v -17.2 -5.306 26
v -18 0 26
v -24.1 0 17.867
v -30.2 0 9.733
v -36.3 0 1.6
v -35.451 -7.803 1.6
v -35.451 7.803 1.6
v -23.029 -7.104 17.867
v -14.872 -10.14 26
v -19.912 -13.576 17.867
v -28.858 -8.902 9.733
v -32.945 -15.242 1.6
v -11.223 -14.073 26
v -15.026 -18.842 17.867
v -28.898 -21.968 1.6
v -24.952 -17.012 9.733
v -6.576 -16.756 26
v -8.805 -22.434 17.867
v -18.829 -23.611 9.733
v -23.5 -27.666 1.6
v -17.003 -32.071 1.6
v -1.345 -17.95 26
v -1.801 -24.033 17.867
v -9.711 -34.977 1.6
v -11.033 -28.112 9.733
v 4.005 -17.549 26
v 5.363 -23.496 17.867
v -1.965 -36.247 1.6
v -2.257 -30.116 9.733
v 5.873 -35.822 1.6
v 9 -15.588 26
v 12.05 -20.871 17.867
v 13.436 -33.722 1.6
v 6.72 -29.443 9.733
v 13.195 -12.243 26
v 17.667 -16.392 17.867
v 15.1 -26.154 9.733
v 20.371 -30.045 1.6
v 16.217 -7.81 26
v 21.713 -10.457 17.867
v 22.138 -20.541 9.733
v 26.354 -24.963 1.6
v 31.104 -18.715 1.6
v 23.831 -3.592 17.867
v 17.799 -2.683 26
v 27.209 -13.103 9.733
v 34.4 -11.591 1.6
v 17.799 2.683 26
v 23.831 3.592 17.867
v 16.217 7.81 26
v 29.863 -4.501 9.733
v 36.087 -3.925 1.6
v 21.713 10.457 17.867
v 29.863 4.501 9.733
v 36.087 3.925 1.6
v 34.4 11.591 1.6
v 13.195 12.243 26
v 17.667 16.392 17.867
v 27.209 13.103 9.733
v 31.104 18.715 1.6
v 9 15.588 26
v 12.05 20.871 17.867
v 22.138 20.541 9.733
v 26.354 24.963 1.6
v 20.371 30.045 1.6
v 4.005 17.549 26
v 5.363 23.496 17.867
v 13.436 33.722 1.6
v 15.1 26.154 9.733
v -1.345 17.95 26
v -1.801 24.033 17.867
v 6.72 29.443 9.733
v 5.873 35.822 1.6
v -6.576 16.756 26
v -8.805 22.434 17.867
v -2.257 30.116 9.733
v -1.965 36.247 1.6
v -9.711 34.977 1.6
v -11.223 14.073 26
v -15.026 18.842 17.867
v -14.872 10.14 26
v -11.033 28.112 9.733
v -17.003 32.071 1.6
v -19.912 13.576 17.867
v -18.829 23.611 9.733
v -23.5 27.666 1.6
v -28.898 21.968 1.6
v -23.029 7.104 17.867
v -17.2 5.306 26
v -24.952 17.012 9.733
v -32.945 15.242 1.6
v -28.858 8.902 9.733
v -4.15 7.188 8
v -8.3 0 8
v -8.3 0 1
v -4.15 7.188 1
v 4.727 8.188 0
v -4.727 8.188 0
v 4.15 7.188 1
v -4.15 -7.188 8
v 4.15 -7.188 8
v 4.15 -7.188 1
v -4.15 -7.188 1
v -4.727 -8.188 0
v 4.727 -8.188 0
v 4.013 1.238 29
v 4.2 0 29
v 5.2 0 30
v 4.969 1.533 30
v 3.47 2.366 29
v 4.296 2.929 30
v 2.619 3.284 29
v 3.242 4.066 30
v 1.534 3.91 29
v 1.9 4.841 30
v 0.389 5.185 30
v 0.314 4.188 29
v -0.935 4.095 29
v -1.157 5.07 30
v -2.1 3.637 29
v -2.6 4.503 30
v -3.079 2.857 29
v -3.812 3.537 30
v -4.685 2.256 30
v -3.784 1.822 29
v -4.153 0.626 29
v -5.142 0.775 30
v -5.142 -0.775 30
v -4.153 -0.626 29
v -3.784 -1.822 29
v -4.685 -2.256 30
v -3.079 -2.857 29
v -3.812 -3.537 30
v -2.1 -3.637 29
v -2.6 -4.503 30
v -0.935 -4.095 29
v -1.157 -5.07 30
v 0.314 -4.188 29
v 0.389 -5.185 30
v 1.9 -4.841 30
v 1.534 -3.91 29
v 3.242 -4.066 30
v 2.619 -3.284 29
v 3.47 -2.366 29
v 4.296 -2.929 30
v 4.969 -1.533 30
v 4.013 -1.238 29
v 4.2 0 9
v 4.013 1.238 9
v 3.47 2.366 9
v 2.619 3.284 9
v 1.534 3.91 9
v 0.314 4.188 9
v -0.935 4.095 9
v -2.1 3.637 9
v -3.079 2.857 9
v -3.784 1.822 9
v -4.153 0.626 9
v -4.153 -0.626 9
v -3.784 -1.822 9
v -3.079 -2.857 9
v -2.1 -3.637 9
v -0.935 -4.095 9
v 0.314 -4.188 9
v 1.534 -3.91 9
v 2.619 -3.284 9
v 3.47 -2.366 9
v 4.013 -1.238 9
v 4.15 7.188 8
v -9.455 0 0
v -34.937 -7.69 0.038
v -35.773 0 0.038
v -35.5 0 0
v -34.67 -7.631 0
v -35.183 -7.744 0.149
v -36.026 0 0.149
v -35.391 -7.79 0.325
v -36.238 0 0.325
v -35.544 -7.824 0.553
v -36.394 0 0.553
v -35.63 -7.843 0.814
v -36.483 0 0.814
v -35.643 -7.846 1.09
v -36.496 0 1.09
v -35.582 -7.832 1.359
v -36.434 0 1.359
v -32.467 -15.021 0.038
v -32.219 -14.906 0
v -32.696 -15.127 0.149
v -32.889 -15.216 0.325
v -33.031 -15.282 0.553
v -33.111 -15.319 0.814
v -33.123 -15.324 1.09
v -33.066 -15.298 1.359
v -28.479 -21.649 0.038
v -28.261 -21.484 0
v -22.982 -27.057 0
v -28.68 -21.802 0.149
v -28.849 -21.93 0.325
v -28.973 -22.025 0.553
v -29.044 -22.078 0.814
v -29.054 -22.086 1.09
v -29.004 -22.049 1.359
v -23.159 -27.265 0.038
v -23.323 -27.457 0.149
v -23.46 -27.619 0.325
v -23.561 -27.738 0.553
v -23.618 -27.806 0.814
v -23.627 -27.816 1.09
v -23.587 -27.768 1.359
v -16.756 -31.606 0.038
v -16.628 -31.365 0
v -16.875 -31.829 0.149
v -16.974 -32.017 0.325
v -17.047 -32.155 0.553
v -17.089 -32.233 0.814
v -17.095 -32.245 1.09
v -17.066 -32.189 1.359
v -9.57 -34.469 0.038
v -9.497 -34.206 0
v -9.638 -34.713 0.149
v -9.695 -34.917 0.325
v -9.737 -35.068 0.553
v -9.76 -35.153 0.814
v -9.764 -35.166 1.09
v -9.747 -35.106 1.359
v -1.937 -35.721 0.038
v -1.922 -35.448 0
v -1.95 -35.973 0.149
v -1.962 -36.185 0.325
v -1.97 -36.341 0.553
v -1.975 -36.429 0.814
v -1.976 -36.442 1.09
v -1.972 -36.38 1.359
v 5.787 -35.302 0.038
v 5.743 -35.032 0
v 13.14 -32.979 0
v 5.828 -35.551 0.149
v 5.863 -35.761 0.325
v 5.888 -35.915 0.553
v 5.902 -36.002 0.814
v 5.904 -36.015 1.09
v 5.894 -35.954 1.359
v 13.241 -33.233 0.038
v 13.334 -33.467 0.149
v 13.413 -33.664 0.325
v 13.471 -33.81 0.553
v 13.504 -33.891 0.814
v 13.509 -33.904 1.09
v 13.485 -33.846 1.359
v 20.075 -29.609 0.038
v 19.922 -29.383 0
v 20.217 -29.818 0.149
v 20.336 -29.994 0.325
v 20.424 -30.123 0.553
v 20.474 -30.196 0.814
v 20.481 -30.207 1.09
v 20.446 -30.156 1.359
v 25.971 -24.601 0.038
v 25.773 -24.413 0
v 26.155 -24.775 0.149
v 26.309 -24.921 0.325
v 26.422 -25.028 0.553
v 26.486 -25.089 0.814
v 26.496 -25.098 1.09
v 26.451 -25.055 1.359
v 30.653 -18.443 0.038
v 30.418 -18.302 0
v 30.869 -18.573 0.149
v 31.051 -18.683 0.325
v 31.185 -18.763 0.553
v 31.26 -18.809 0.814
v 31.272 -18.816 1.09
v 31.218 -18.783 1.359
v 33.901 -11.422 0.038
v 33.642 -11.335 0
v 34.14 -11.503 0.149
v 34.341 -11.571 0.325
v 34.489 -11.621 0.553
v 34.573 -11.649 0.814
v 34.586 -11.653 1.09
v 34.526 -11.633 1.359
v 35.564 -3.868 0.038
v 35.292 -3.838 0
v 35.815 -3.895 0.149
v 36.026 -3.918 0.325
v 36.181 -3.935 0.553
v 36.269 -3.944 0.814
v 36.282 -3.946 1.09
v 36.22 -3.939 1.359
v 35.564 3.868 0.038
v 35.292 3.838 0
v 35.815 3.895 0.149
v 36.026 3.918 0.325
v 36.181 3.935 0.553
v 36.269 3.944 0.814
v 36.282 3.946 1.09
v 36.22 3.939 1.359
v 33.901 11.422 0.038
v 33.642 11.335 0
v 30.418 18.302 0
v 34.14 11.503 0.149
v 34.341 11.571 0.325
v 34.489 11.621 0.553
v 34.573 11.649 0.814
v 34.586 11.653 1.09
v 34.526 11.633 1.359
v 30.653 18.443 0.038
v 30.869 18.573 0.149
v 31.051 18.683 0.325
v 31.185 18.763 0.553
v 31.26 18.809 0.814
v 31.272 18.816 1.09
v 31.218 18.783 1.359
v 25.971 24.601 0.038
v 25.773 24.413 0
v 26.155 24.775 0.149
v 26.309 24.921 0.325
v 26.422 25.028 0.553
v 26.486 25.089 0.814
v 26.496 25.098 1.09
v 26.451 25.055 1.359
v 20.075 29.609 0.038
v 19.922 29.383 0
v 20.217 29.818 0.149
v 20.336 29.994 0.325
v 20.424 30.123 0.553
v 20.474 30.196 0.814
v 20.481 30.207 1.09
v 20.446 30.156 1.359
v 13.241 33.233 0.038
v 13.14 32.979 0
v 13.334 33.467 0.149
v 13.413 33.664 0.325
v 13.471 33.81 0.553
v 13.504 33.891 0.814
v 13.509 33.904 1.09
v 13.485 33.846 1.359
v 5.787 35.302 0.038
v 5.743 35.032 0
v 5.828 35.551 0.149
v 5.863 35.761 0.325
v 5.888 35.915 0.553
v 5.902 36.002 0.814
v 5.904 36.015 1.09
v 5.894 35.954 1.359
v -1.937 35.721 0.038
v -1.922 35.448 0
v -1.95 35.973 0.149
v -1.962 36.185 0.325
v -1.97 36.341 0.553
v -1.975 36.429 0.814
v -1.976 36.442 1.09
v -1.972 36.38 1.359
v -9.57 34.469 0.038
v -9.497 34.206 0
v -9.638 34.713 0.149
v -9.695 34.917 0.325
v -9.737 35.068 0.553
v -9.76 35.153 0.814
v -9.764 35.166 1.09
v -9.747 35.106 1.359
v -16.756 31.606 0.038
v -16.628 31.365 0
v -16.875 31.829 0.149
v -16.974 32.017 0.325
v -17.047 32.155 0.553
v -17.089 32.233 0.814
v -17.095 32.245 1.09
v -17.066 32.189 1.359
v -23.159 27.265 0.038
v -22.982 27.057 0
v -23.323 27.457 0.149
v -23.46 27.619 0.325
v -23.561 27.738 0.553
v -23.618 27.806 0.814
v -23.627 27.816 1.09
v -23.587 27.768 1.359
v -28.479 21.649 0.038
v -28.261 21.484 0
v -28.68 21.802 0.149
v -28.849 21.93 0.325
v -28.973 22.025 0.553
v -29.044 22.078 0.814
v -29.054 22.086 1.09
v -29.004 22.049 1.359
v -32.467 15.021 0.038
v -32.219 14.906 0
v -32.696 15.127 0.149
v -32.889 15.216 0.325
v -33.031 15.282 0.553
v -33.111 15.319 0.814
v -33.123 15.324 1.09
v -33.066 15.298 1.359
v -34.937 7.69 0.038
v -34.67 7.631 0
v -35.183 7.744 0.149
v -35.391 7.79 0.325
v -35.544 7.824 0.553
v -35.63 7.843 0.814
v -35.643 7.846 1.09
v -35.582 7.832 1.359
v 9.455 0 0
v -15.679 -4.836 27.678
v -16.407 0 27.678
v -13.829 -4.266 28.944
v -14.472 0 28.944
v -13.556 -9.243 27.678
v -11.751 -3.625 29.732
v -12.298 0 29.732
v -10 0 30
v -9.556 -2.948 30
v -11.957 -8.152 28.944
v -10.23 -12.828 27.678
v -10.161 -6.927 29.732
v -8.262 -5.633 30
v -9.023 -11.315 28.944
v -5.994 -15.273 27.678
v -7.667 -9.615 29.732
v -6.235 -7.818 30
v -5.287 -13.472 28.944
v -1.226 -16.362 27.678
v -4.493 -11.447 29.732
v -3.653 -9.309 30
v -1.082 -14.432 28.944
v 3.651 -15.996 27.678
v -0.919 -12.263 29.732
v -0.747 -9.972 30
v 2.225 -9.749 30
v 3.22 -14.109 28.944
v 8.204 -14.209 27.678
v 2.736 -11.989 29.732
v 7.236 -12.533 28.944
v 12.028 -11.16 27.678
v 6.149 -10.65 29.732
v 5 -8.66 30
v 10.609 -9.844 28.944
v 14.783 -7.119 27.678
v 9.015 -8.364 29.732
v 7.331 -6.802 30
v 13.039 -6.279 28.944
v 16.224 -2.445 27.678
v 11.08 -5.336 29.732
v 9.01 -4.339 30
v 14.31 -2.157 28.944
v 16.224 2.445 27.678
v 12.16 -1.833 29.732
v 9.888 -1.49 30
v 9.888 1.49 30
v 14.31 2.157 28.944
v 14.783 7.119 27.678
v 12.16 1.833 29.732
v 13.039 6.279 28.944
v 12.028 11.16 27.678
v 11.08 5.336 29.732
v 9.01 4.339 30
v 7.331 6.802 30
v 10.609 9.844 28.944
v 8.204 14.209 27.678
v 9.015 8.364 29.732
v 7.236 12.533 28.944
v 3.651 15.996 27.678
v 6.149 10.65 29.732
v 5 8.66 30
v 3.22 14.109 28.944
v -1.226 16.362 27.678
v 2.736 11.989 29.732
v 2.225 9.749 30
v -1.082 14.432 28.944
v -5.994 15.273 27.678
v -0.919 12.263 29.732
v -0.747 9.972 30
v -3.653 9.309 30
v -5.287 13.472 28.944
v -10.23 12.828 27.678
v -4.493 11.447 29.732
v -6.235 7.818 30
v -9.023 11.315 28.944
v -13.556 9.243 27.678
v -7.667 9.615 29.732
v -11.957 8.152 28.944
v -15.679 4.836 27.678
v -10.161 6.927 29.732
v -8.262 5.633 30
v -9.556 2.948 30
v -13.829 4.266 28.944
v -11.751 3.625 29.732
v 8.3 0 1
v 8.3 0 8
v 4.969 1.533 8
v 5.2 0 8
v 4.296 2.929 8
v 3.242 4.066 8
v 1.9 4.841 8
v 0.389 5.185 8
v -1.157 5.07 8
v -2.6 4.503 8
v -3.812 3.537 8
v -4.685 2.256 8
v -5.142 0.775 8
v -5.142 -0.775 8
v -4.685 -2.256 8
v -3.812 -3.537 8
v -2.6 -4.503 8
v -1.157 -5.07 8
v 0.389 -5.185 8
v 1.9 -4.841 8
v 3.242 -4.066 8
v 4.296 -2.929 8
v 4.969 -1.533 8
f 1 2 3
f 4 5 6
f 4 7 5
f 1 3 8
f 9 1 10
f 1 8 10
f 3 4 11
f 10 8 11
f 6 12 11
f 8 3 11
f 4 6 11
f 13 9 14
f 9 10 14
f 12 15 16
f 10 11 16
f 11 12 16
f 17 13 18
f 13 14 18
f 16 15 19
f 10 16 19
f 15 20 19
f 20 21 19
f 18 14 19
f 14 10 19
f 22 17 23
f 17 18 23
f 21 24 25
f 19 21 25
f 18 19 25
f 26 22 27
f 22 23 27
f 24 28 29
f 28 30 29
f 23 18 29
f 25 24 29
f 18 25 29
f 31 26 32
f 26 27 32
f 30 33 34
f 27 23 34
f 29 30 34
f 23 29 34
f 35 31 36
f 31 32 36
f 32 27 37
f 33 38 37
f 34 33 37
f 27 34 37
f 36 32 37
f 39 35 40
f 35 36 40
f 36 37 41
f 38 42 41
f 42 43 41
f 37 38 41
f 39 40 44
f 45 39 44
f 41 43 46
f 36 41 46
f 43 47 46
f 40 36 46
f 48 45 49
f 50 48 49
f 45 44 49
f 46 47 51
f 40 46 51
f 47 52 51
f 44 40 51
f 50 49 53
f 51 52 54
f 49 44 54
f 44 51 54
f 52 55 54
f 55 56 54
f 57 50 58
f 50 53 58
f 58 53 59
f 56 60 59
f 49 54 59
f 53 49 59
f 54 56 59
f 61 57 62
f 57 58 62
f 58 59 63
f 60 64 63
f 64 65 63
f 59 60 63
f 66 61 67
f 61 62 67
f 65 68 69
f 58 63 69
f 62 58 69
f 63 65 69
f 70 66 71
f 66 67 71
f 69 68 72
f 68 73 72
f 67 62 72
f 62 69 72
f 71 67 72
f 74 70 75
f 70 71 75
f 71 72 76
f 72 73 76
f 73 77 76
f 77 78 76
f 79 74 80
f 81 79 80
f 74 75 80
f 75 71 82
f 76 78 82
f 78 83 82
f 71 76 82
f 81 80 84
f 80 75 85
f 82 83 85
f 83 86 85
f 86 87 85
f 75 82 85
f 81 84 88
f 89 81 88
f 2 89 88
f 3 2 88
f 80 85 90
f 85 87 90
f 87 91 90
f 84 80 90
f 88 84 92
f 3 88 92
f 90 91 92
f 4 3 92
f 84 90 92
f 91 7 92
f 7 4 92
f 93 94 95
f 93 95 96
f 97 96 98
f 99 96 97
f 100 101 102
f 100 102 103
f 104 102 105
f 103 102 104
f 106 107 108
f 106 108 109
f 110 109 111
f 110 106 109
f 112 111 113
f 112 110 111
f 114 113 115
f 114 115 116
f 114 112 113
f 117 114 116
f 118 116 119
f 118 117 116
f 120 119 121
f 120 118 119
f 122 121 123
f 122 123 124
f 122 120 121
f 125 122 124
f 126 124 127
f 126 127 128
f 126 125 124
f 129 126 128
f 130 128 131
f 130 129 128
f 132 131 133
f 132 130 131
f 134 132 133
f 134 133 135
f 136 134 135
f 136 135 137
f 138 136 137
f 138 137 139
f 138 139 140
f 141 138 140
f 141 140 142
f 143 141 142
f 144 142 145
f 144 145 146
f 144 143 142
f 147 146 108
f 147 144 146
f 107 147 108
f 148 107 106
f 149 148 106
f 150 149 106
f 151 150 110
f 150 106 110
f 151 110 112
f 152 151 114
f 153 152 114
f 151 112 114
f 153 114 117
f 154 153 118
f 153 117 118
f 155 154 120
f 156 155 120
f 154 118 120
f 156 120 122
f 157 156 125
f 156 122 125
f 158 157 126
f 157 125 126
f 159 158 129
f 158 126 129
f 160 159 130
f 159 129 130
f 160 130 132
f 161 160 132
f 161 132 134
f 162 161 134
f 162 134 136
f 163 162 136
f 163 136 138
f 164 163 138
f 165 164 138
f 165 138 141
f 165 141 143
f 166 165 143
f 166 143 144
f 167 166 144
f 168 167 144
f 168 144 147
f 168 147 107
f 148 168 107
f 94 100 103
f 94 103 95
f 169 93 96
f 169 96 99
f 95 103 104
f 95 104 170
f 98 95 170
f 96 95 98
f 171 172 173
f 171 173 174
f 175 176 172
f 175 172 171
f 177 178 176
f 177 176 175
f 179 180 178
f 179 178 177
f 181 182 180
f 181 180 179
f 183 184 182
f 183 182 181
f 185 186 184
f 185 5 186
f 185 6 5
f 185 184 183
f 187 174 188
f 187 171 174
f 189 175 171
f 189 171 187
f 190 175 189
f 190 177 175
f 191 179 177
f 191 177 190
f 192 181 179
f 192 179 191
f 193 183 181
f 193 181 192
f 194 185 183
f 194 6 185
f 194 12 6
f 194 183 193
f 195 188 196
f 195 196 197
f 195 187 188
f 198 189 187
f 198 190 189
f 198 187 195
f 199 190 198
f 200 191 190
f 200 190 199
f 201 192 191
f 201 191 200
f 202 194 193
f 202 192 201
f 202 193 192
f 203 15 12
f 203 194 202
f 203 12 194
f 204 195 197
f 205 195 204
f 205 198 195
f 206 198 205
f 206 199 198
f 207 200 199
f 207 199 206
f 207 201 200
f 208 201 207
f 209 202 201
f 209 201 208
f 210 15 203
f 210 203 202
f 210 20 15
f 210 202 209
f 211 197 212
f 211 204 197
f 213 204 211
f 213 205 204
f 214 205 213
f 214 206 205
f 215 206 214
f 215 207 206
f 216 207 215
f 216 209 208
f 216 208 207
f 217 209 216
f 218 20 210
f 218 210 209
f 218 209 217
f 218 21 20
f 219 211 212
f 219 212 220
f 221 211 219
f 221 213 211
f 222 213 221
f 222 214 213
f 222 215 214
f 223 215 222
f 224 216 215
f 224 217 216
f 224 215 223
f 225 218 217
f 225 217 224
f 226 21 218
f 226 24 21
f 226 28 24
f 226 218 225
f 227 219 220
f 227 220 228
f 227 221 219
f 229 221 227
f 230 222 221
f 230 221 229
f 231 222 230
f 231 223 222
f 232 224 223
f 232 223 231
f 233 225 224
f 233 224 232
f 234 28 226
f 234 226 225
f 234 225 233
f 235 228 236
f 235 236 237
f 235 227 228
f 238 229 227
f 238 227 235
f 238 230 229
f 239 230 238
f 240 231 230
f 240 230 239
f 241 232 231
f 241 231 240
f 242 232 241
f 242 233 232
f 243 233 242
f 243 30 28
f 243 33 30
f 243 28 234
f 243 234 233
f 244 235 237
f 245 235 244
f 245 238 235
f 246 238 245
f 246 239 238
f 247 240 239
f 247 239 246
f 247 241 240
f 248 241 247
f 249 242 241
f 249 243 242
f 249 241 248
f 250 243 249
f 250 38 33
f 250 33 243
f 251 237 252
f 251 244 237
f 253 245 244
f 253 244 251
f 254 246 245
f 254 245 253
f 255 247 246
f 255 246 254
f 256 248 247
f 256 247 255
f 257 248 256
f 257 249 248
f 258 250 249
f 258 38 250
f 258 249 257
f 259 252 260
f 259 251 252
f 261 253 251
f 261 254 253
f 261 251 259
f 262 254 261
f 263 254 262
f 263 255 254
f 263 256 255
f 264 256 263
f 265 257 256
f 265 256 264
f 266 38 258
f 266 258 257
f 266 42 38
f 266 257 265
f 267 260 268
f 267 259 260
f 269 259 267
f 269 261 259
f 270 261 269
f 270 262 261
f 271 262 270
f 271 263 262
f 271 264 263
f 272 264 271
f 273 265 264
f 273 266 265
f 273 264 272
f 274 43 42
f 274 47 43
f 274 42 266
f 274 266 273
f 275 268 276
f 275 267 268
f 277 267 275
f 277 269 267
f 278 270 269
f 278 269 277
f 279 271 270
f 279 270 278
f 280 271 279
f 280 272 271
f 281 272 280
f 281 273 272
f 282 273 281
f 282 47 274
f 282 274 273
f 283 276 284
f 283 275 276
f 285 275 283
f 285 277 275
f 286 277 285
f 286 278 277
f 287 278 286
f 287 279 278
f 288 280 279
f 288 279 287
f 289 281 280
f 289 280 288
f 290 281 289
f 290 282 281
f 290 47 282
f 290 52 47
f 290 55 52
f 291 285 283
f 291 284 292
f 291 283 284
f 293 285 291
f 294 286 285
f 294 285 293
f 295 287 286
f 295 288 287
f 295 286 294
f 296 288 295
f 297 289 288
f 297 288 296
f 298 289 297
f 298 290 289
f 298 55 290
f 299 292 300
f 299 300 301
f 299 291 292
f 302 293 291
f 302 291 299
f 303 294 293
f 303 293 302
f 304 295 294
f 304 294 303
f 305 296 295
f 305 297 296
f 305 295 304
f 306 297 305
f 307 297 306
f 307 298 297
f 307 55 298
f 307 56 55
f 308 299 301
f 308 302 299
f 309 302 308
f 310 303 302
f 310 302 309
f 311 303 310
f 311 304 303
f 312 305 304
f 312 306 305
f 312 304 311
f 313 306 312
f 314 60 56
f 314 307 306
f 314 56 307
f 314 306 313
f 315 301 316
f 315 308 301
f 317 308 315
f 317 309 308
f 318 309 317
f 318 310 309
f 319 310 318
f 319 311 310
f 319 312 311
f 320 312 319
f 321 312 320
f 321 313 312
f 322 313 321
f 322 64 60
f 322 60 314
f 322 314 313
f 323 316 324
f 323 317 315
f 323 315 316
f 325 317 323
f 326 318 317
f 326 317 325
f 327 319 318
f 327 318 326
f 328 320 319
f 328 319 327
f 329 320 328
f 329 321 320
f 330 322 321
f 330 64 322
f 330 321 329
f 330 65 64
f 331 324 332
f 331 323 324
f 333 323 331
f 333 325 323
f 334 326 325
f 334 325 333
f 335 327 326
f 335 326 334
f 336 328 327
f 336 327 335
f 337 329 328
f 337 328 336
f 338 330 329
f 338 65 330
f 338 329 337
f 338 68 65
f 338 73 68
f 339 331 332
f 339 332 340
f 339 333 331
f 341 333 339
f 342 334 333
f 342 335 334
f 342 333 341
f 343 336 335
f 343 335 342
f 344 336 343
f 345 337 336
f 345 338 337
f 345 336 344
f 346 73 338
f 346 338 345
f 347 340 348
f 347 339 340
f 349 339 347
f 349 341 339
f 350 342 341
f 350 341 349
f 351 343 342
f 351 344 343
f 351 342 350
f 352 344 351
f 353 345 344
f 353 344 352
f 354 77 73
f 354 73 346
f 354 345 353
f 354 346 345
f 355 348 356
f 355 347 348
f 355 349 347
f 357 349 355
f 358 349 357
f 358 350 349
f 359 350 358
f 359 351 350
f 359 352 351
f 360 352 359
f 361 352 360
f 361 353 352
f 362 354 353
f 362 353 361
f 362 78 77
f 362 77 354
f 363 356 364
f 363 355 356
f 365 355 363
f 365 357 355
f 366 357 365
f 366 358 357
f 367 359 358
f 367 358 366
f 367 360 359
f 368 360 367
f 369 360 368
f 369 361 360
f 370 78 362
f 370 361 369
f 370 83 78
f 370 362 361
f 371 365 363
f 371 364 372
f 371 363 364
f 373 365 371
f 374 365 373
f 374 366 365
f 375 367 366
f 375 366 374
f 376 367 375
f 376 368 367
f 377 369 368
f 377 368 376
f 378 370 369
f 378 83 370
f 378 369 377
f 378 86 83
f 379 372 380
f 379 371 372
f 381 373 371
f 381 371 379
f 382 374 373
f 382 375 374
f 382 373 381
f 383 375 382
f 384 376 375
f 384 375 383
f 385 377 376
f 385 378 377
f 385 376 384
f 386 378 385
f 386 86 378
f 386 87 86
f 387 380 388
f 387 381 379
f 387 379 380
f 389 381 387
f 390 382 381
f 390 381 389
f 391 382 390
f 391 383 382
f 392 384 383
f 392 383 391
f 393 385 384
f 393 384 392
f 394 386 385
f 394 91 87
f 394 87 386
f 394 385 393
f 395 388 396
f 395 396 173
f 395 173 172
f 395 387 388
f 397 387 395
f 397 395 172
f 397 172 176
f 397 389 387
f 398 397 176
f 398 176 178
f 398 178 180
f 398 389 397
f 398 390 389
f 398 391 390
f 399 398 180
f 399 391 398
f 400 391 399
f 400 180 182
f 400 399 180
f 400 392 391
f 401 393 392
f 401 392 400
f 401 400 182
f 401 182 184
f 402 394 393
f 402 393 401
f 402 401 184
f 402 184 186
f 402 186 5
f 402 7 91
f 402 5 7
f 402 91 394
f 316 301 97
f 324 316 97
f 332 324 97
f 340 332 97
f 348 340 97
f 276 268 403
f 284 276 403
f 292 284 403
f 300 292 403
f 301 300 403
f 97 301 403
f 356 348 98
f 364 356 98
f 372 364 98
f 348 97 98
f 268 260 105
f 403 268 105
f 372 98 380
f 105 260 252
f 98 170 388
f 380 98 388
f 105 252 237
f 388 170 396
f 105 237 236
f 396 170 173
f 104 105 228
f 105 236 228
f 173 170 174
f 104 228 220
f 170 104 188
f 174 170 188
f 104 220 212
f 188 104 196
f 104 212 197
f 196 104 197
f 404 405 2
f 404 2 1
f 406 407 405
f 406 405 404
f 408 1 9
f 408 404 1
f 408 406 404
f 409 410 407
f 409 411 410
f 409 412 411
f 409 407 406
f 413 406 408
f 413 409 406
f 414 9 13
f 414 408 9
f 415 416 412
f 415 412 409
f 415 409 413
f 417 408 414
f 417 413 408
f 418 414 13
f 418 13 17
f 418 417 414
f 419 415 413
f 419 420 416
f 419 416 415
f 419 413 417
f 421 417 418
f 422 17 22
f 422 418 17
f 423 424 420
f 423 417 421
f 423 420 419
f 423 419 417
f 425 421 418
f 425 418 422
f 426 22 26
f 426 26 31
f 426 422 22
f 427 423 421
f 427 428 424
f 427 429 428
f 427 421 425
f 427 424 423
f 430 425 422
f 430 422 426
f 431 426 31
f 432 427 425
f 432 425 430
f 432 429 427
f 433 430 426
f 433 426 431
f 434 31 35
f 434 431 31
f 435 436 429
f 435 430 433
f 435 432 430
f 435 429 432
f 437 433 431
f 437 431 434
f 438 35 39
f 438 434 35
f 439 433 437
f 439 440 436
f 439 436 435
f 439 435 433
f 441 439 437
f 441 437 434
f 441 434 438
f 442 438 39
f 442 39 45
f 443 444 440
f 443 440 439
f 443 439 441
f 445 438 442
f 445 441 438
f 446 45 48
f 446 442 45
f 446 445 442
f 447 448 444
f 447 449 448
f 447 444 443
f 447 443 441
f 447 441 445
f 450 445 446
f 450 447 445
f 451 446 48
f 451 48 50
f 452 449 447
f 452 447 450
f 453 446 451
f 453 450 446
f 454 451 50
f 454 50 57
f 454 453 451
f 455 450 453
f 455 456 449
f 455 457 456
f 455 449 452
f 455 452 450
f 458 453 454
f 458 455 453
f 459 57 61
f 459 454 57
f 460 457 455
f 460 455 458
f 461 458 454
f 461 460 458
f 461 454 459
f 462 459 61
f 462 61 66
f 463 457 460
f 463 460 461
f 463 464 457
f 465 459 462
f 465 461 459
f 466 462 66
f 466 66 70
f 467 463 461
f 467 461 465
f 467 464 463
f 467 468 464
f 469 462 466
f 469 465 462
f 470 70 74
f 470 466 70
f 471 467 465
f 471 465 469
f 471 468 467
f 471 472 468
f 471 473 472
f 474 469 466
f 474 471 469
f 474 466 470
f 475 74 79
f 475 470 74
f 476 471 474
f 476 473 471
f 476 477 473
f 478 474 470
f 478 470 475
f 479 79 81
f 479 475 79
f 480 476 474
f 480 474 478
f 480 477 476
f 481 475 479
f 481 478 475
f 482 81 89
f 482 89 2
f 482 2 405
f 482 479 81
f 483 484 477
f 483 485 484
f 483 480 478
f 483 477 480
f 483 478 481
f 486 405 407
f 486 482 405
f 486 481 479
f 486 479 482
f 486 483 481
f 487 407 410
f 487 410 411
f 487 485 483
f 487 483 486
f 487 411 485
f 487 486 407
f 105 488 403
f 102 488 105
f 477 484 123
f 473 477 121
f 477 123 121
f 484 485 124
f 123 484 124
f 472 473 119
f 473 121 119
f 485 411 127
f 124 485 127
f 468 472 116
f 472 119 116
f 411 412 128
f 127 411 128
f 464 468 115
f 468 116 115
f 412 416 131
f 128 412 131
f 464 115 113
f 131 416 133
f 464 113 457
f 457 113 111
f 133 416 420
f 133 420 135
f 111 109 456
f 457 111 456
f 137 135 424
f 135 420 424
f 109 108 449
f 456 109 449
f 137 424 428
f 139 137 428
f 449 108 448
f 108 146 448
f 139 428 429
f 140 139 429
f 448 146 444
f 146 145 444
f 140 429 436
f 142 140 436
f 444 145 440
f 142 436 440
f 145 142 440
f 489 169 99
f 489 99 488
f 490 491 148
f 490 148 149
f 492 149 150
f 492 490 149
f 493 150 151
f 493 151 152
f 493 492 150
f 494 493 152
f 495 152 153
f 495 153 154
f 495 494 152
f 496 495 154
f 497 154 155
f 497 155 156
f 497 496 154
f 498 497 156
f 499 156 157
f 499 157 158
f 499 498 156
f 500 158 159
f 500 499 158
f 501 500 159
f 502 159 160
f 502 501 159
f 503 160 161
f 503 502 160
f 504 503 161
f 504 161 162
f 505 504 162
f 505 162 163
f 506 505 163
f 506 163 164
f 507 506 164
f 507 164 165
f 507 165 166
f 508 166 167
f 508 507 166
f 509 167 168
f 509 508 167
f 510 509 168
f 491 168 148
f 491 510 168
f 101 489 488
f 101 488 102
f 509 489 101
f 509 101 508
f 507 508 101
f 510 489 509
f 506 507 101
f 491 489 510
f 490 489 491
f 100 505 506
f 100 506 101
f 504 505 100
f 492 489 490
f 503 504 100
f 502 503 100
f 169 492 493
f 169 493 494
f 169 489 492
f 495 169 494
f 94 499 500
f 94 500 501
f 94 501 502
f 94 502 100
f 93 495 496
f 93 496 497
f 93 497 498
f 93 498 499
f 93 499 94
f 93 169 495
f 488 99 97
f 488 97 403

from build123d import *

# Parameters (mm, degrees)
FILLET1_R          = 1
FILLET2_R          = 10
SKETCH2_R          = 4.2
CUT_EXTRUDE1_DEPTH = 60.703433859
CUT_EXTRUDE2_START = -8
CUT_EXTRUDE2_DEPTH = 68.703433859
CHAMFER1_SIZE      = 1


with BuildPart() as part:
    # Sketch1 → Revolve1 (revolve)
    with BuildSketch(Plane(origin=(0, 0, 0), x_dir=(1, 0, 0), z_dir=(0, 1, 0))):
        Polygon((-37.5, 0), (0, 0), (0, -30), (-15, -30), align=None)
    revolve(axis=Axis((0, 0, 0), (0, 0, 1)))

    # Fillet1
    fillet1_edges = [part.edges().sort_by_distance(p)[0] for p in [
        (37.5, 0, 0),
    ]]
    fillet(fillet1_edges, radius=FILLET1_R)

    # Fillet2
    fillet2_edges = [part.edges().sort_by_distance(p)[0] for p in [
        (15, 0, 30),
    ]]
    fillet(fillet2_edges, radius=FILLET2_R)

    # Sketch2 → Cut-Extrude1 (cut, through all)
    with BuildSketch(Plane.XY.offset(30)):
        Circle(SKETCH2_R)
    extrude(amount=-CUT_EXTRUDE1_DEPTH, mode=Mode.SUBTRACT)

    # Sketch3 → Cut-Extrude2 (cut, through all)
    with BuildSketch(Plane(origin=(0, 0, 0), x_dir=(-1, 0, 0), z_dir=(0, 0, -1)).offset(CUT_EXTRUDE2_START)):
        Polygon((-8.29998747, 0), (-4.149993735, -7.188), (4.149993735, -7.188), (8.29998747, 0), (4.149993735, 7.188), (-4.149993735, 7.188), align=None)
    extrude(amount=CUT_EXTRUDE2_DEPTH, mode=Mode.SUBTRACT)

    # Chamfer1
    chamfer1_edges = [part.edges().sort_by_distance(p)[0] for p in [
        (-4.2, 0, 30),
        (6.224990602, 3.594, 0),
        (6.224990602, -3.594, 0),
        (0, -7.188, 0),
        (-6.224990602, -3.594, 0),
        (-6.224990602, 3.594, 0),
        (0, 7.188, 0),
        (-4.2, 0, 8),
    ]]
    chamfer(chamfer1_edges, length=CHAMFER1_SIZE)


solid = part.part
